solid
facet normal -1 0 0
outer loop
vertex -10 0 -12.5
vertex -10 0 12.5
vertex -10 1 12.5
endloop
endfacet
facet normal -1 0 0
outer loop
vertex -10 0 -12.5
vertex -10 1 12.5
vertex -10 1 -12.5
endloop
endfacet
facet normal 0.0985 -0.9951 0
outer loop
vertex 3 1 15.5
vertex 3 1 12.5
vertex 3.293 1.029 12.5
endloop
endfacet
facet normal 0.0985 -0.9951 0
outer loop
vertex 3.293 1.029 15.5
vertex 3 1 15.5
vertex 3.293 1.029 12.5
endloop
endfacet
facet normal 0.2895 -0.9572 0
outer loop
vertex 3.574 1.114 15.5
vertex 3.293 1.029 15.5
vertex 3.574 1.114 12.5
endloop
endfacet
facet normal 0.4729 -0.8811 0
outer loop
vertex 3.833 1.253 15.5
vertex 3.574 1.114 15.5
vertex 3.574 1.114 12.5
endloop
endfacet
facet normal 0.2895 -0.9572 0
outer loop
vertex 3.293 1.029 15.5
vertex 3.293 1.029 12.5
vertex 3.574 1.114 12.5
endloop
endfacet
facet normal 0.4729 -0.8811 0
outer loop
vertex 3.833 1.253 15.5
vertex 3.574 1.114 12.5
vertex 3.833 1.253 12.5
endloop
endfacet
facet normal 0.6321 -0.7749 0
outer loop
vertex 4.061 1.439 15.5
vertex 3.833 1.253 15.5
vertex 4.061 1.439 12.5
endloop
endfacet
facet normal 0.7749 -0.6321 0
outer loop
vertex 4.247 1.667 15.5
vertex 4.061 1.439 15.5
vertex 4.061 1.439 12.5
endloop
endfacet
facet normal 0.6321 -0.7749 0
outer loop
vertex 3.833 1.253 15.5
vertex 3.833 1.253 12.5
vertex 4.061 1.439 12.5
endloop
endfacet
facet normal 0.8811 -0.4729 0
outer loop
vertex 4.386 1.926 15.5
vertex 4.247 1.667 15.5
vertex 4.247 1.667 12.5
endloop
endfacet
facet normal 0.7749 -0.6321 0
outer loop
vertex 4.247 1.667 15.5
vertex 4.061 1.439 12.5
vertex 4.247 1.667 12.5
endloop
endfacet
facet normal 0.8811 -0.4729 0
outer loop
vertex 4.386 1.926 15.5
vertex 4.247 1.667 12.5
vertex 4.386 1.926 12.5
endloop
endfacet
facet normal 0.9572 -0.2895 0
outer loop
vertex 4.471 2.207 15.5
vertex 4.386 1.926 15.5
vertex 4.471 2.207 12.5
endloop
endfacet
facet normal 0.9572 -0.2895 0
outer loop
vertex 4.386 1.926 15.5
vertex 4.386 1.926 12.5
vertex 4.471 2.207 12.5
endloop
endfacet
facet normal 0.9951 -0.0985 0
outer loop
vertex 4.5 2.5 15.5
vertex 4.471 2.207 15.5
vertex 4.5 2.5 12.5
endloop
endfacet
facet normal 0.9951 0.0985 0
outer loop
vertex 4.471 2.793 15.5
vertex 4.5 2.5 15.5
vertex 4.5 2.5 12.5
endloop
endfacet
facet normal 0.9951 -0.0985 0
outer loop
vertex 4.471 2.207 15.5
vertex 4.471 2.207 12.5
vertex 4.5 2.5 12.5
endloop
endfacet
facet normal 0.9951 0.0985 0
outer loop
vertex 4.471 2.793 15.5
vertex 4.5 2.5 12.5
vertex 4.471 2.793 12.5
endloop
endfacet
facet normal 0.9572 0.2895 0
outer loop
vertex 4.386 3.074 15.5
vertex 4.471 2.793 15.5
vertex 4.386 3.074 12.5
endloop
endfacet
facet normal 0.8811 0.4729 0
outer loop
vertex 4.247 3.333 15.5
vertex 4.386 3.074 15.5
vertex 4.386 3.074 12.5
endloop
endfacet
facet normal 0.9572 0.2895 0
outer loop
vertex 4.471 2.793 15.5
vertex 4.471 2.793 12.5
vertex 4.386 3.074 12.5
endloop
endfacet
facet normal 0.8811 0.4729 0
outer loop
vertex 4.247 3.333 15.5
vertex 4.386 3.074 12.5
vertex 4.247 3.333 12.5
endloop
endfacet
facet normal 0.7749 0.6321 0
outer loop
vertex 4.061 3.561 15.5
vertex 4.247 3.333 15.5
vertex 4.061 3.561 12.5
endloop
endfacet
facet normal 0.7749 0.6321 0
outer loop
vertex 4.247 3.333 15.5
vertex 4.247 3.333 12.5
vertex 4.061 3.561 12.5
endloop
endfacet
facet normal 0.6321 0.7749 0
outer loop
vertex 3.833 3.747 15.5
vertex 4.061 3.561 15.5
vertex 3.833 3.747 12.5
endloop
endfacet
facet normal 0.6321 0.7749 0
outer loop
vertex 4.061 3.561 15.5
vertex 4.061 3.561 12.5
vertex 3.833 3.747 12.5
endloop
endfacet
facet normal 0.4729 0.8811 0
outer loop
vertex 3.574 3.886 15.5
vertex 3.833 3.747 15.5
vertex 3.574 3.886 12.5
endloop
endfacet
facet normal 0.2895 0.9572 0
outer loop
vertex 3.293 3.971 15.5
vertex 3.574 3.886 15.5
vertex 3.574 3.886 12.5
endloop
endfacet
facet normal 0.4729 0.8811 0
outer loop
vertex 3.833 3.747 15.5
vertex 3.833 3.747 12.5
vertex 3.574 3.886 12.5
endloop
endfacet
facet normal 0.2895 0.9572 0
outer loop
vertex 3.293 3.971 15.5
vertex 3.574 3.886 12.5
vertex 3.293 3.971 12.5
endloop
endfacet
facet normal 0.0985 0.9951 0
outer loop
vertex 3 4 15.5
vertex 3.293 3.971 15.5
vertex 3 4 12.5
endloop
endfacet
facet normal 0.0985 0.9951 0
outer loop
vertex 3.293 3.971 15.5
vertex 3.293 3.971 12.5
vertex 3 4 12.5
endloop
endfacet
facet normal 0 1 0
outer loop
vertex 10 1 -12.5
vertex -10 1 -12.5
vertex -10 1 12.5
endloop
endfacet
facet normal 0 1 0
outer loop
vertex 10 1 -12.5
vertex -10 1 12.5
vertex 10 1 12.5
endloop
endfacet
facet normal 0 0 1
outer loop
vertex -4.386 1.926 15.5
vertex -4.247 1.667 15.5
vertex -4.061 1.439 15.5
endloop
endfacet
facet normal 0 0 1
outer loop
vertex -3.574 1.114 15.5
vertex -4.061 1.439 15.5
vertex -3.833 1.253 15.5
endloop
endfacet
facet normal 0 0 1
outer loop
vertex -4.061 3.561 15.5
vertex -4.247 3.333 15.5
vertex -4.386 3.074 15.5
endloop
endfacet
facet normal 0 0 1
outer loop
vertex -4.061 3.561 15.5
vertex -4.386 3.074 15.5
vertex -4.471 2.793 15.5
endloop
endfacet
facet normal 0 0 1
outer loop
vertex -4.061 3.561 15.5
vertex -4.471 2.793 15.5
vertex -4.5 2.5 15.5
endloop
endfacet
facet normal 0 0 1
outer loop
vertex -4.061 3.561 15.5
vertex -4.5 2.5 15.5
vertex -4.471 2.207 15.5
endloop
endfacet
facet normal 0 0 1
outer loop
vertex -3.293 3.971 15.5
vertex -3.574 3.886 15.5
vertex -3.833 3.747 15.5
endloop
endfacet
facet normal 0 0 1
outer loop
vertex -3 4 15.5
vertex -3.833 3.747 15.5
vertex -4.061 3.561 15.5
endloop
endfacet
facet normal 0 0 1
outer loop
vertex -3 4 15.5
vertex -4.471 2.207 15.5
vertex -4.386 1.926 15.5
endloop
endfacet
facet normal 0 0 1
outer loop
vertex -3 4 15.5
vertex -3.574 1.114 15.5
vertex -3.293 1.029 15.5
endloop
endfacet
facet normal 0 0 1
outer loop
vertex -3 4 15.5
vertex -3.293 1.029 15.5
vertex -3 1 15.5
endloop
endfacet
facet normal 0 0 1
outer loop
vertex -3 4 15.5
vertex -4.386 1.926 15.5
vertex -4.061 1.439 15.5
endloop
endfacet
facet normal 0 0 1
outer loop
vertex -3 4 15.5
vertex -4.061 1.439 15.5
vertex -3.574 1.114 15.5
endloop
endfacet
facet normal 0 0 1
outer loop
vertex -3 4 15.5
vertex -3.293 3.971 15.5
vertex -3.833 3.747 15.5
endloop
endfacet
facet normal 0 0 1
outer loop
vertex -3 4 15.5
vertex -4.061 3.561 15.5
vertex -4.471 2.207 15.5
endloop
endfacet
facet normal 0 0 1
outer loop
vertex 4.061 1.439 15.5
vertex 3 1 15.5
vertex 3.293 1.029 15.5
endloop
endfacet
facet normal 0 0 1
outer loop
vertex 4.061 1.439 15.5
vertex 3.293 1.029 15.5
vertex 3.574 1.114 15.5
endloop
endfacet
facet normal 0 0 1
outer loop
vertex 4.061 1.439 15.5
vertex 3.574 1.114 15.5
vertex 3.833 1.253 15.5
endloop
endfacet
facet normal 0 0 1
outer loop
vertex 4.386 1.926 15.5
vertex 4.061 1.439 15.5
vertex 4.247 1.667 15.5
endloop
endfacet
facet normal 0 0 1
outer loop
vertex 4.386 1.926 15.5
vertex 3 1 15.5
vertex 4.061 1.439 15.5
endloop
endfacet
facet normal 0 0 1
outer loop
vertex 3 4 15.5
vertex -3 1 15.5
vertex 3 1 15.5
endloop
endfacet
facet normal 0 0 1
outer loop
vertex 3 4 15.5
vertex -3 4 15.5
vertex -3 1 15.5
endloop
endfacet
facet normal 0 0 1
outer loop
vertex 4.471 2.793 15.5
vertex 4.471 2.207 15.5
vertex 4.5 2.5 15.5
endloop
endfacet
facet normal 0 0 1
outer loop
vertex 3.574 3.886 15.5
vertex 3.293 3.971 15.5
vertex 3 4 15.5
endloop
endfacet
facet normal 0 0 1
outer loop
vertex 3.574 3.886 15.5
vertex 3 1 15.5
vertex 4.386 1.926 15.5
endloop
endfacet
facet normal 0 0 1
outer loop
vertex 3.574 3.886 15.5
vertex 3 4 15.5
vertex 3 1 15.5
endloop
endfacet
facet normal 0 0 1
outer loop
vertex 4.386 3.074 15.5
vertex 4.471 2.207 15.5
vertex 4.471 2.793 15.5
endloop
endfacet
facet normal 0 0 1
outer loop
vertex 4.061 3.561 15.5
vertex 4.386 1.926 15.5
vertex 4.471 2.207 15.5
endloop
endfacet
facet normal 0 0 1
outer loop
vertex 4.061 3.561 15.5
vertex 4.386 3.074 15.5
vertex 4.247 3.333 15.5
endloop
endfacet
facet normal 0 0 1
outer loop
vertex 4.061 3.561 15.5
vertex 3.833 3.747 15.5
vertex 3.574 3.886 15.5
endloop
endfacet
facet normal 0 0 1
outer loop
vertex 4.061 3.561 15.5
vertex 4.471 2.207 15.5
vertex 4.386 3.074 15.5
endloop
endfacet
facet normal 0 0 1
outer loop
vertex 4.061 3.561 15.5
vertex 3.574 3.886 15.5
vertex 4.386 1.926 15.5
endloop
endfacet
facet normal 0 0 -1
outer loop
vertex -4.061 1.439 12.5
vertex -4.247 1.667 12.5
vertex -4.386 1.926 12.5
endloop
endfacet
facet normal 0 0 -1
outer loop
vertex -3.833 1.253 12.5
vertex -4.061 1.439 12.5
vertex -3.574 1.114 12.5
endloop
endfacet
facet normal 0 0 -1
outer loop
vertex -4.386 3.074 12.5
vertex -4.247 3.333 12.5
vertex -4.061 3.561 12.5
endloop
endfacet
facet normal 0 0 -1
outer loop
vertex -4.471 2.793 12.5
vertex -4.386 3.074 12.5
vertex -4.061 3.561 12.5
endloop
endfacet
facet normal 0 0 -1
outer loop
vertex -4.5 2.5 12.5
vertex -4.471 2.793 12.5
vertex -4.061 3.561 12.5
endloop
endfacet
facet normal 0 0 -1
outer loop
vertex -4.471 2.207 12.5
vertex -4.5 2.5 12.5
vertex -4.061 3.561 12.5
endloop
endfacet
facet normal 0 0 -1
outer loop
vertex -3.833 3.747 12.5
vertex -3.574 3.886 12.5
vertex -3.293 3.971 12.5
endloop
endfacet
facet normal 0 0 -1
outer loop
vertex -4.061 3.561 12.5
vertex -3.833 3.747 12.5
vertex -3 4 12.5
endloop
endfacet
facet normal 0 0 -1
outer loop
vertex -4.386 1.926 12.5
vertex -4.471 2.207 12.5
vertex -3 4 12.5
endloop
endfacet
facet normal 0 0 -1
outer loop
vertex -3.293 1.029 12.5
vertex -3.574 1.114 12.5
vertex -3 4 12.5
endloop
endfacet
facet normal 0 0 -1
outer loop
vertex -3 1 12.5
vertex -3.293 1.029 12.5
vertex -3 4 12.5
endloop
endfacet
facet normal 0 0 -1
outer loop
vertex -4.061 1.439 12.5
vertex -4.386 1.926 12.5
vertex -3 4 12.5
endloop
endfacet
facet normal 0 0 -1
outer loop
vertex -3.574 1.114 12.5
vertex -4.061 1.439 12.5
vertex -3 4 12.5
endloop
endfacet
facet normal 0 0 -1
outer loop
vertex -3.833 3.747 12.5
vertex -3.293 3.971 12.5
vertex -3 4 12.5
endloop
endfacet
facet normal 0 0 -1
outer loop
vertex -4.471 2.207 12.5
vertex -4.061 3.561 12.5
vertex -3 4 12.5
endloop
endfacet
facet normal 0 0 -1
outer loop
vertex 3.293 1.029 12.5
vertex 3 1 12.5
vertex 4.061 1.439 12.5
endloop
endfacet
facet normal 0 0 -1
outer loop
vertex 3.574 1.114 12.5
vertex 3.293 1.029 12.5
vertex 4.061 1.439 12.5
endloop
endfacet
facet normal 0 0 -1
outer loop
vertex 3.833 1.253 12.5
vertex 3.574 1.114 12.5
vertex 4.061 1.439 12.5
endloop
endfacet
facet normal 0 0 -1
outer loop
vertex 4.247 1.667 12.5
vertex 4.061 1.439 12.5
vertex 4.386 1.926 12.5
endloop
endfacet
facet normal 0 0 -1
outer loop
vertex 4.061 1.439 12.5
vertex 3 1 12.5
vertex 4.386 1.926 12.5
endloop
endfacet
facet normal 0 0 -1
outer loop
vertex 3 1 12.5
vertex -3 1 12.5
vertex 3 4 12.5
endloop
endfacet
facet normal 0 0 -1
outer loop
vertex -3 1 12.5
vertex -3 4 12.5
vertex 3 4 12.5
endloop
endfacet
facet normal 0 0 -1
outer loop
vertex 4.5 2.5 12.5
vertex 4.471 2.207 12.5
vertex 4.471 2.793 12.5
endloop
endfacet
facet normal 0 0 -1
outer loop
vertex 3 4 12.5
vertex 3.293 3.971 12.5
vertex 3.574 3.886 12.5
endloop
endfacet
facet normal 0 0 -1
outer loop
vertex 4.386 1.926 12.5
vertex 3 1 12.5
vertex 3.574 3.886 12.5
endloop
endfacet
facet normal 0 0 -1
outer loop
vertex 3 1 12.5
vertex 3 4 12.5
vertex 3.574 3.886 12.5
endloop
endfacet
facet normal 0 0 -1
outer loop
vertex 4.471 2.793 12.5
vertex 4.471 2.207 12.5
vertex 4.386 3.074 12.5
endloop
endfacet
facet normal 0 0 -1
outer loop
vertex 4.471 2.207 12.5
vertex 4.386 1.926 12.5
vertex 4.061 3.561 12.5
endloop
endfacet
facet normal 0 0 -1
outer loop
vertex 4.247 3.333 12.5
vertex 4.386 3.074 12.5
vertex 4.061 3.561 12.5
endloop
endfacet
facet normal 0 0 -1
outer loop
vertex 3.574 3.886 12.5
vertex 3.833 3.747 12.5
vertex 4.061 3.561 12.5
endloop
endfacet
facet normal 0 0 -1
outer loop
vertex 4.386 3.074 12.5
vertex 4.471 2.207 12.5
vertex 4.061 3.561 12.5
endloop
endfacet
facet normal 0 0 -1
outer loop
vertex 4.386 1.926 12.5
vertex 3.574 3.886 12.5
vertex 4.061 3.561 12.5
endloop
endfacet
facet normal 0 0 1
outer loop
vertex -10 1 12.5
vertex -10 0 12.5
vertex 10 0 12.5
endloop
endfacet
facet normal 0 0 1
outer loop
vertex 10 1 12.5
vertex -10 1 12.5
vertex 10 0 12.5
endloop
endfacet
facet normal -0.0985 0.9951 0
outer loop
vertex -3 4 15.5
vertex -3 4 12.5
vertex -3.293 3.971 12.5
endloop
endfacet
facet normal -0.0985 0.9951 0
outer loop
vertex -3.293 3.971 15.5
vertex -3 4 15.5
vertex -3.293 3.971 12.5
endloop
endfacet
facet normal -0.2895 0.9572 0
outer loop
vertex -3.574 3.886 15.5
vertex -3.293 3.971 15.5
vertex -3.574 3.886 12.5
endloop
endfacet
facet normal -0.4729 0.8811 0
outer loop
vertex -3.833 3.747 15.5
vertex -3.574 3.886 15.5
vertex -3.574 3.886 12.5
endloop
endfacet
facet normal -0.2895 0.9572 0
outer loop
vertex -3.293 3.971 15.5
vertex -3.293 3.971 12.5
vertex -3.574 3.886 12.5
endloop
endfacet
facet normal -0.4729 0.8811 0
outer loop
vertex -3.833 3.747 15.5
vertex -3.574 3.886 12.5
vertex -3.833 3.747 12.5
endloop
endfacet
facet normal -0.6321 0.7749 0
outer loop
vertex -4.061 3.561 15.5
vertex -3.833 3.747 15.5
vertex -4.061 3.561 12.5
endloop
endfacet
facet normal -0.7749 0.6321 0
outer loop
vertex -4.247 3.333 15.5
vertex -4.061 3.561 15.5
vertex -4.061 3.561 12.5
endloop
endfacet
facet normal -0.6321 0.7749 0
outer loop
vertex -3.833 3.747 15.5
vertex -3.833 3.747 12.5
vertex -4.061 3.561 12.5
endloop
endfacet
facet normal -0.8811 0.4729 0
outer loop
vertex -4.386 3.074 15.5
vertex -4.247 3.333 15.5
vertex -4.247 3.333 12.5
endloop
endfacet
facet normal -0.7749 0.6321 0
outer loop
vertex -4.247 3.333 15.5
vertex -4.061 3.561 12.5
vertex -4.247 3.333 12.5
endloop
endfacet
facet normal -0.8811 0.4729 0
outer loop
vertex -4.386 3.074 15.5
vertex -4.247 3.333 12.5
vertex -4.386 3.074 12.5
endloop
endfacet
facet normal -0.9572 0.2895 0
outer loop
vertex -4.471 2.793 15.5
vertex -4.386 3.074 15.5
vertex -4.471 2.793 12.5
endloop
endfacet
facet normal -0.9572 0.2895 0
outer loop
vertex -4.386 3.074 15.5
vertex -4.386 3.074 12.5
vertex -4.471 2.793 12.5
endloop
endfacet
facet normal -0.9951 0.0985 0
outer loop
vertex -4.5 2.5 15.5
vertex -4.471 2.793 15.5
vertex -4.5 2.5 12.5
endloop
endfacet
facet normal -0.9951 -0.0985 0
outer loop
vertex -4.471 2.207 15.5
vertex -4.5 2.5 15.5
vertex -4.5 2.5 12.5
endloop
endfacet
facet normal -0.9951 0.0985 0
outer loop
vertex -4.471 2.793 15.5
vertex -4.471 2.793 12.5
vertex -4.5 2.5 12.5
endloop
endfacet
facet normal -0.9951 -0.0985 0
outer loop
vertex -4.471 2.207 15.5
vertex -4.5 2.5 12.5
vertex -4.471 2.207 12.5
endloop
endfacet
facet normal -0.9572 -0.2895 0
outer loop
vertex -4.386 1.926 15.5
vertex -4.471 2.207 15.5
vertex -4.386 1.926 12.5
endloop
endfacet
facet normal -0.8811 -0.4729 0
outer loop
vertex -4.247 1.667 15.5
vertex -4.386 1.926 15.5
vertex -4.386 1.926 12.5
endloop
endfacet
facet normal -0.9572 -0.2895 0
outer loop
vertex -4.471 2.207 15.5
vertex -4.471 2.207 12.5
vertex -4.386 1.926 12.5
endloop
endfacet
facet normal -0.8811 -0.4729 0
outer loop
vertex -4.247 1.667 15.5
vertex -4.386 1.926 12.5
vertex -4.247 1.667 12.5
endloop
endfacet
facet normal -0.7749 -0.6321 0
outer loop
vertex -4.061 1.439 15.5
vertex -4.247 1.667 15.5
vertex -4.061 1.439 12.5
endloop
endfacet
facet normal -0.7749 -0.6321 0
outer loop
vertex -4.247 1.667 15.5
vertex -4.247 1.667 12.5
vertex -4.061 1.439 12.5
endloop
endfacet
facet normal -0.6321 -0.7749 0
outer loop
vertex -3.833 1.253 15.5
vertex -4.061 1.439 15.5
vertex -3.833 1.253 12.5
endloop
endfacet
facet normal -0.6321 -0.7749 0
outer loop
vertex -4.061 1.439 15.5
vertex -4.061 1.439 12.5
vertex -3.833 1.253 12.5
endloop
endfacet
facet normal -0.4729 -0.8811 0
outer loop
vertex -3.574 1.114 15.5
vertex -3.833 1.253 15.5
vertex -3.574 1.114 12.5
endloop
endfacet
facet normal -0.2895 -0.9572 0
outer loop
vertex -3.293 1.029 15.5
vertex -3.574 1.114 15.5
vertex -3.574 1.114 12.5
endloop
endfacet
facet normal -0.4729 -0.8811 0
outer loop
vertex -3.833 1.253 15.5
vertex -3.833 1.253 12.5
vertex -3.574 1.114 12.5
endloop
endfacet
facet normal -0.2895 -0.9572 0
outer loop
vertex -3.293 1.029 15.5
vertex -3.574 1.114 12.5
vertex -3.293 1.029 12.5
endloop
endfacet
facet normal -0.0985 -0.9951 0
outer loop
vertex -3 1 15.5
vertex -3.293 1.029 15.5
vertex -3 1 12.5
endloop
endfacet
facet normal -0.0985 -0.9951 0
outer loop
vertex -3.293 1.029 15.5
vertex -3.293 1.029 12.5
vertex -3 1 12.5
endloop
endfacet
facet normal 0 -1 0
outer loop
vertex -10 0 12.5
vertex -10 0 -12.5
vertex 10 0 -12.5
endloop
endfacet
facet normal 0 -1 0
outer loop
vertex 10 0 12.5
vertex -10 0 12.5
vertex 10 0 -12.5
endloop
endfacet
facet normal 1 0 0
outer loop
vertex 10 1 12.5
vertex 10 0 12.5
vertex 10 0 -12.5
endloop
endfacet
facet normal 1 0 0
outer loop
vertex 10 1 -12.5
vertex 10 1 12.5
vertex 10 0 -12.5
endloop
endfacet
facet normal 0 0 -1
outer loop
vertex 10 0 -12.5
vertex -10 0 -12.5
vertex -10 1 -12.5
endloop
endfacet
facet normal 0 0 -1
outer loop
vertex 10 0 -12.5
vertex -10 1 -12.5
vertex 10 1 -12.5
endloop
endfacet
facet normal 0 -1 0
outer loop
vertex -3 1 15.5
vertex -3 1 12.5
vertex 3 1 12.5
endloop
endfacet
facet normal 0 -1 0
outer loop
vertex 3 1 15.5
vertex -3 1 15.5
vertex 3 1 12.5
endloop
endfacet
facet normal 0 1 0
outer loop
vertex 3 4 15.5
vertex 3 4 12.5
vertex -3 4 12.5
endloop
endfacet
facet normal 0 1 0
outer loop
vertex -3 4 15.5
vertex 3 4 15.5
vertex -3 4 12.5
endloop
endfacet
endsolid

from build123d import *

# Parameters (mm, degrees)
SKETCH1_W           = 20
SKETCH1_H           = 25
BOSS_EXTRUDE1_DEPTH = 1
BOSS_EXTRUDE2_DEPTH = 3


with BuildPart() as part:
    # Sketch1 → Boss-Extrude1 (new body)
    with BuildSketch(Plane(origin=(0, 0, 0), x_dir=(1, 0, 0), z_dir=(0, 1, 0))):
        Rectangle(SKETCH1_W, SKETCH1_H)
    extrude(amount=BOSS_EXTRUDE1_DEPTH)


with BuildPart() as body_2:
    # Sketch2 → Boss-Extrude2 (new body)
    with BuildSketch(Plane.XY.offset(12.5)):
        with BuildLine():
            Line((-3, 1), (3, 1))
            ThreePointArc((3, 1), (4.5, 2.5), (3, 4))
            Line((3, 4), (-3, 4))
            ThreePointArc((-3, 4), (-4.5, 2.5), (-3, 1))
        make_face()
    extrude(amount=BOSS_EXTRUDE2_DEPTH)


solid = Compound([part.part, body_2.part])
